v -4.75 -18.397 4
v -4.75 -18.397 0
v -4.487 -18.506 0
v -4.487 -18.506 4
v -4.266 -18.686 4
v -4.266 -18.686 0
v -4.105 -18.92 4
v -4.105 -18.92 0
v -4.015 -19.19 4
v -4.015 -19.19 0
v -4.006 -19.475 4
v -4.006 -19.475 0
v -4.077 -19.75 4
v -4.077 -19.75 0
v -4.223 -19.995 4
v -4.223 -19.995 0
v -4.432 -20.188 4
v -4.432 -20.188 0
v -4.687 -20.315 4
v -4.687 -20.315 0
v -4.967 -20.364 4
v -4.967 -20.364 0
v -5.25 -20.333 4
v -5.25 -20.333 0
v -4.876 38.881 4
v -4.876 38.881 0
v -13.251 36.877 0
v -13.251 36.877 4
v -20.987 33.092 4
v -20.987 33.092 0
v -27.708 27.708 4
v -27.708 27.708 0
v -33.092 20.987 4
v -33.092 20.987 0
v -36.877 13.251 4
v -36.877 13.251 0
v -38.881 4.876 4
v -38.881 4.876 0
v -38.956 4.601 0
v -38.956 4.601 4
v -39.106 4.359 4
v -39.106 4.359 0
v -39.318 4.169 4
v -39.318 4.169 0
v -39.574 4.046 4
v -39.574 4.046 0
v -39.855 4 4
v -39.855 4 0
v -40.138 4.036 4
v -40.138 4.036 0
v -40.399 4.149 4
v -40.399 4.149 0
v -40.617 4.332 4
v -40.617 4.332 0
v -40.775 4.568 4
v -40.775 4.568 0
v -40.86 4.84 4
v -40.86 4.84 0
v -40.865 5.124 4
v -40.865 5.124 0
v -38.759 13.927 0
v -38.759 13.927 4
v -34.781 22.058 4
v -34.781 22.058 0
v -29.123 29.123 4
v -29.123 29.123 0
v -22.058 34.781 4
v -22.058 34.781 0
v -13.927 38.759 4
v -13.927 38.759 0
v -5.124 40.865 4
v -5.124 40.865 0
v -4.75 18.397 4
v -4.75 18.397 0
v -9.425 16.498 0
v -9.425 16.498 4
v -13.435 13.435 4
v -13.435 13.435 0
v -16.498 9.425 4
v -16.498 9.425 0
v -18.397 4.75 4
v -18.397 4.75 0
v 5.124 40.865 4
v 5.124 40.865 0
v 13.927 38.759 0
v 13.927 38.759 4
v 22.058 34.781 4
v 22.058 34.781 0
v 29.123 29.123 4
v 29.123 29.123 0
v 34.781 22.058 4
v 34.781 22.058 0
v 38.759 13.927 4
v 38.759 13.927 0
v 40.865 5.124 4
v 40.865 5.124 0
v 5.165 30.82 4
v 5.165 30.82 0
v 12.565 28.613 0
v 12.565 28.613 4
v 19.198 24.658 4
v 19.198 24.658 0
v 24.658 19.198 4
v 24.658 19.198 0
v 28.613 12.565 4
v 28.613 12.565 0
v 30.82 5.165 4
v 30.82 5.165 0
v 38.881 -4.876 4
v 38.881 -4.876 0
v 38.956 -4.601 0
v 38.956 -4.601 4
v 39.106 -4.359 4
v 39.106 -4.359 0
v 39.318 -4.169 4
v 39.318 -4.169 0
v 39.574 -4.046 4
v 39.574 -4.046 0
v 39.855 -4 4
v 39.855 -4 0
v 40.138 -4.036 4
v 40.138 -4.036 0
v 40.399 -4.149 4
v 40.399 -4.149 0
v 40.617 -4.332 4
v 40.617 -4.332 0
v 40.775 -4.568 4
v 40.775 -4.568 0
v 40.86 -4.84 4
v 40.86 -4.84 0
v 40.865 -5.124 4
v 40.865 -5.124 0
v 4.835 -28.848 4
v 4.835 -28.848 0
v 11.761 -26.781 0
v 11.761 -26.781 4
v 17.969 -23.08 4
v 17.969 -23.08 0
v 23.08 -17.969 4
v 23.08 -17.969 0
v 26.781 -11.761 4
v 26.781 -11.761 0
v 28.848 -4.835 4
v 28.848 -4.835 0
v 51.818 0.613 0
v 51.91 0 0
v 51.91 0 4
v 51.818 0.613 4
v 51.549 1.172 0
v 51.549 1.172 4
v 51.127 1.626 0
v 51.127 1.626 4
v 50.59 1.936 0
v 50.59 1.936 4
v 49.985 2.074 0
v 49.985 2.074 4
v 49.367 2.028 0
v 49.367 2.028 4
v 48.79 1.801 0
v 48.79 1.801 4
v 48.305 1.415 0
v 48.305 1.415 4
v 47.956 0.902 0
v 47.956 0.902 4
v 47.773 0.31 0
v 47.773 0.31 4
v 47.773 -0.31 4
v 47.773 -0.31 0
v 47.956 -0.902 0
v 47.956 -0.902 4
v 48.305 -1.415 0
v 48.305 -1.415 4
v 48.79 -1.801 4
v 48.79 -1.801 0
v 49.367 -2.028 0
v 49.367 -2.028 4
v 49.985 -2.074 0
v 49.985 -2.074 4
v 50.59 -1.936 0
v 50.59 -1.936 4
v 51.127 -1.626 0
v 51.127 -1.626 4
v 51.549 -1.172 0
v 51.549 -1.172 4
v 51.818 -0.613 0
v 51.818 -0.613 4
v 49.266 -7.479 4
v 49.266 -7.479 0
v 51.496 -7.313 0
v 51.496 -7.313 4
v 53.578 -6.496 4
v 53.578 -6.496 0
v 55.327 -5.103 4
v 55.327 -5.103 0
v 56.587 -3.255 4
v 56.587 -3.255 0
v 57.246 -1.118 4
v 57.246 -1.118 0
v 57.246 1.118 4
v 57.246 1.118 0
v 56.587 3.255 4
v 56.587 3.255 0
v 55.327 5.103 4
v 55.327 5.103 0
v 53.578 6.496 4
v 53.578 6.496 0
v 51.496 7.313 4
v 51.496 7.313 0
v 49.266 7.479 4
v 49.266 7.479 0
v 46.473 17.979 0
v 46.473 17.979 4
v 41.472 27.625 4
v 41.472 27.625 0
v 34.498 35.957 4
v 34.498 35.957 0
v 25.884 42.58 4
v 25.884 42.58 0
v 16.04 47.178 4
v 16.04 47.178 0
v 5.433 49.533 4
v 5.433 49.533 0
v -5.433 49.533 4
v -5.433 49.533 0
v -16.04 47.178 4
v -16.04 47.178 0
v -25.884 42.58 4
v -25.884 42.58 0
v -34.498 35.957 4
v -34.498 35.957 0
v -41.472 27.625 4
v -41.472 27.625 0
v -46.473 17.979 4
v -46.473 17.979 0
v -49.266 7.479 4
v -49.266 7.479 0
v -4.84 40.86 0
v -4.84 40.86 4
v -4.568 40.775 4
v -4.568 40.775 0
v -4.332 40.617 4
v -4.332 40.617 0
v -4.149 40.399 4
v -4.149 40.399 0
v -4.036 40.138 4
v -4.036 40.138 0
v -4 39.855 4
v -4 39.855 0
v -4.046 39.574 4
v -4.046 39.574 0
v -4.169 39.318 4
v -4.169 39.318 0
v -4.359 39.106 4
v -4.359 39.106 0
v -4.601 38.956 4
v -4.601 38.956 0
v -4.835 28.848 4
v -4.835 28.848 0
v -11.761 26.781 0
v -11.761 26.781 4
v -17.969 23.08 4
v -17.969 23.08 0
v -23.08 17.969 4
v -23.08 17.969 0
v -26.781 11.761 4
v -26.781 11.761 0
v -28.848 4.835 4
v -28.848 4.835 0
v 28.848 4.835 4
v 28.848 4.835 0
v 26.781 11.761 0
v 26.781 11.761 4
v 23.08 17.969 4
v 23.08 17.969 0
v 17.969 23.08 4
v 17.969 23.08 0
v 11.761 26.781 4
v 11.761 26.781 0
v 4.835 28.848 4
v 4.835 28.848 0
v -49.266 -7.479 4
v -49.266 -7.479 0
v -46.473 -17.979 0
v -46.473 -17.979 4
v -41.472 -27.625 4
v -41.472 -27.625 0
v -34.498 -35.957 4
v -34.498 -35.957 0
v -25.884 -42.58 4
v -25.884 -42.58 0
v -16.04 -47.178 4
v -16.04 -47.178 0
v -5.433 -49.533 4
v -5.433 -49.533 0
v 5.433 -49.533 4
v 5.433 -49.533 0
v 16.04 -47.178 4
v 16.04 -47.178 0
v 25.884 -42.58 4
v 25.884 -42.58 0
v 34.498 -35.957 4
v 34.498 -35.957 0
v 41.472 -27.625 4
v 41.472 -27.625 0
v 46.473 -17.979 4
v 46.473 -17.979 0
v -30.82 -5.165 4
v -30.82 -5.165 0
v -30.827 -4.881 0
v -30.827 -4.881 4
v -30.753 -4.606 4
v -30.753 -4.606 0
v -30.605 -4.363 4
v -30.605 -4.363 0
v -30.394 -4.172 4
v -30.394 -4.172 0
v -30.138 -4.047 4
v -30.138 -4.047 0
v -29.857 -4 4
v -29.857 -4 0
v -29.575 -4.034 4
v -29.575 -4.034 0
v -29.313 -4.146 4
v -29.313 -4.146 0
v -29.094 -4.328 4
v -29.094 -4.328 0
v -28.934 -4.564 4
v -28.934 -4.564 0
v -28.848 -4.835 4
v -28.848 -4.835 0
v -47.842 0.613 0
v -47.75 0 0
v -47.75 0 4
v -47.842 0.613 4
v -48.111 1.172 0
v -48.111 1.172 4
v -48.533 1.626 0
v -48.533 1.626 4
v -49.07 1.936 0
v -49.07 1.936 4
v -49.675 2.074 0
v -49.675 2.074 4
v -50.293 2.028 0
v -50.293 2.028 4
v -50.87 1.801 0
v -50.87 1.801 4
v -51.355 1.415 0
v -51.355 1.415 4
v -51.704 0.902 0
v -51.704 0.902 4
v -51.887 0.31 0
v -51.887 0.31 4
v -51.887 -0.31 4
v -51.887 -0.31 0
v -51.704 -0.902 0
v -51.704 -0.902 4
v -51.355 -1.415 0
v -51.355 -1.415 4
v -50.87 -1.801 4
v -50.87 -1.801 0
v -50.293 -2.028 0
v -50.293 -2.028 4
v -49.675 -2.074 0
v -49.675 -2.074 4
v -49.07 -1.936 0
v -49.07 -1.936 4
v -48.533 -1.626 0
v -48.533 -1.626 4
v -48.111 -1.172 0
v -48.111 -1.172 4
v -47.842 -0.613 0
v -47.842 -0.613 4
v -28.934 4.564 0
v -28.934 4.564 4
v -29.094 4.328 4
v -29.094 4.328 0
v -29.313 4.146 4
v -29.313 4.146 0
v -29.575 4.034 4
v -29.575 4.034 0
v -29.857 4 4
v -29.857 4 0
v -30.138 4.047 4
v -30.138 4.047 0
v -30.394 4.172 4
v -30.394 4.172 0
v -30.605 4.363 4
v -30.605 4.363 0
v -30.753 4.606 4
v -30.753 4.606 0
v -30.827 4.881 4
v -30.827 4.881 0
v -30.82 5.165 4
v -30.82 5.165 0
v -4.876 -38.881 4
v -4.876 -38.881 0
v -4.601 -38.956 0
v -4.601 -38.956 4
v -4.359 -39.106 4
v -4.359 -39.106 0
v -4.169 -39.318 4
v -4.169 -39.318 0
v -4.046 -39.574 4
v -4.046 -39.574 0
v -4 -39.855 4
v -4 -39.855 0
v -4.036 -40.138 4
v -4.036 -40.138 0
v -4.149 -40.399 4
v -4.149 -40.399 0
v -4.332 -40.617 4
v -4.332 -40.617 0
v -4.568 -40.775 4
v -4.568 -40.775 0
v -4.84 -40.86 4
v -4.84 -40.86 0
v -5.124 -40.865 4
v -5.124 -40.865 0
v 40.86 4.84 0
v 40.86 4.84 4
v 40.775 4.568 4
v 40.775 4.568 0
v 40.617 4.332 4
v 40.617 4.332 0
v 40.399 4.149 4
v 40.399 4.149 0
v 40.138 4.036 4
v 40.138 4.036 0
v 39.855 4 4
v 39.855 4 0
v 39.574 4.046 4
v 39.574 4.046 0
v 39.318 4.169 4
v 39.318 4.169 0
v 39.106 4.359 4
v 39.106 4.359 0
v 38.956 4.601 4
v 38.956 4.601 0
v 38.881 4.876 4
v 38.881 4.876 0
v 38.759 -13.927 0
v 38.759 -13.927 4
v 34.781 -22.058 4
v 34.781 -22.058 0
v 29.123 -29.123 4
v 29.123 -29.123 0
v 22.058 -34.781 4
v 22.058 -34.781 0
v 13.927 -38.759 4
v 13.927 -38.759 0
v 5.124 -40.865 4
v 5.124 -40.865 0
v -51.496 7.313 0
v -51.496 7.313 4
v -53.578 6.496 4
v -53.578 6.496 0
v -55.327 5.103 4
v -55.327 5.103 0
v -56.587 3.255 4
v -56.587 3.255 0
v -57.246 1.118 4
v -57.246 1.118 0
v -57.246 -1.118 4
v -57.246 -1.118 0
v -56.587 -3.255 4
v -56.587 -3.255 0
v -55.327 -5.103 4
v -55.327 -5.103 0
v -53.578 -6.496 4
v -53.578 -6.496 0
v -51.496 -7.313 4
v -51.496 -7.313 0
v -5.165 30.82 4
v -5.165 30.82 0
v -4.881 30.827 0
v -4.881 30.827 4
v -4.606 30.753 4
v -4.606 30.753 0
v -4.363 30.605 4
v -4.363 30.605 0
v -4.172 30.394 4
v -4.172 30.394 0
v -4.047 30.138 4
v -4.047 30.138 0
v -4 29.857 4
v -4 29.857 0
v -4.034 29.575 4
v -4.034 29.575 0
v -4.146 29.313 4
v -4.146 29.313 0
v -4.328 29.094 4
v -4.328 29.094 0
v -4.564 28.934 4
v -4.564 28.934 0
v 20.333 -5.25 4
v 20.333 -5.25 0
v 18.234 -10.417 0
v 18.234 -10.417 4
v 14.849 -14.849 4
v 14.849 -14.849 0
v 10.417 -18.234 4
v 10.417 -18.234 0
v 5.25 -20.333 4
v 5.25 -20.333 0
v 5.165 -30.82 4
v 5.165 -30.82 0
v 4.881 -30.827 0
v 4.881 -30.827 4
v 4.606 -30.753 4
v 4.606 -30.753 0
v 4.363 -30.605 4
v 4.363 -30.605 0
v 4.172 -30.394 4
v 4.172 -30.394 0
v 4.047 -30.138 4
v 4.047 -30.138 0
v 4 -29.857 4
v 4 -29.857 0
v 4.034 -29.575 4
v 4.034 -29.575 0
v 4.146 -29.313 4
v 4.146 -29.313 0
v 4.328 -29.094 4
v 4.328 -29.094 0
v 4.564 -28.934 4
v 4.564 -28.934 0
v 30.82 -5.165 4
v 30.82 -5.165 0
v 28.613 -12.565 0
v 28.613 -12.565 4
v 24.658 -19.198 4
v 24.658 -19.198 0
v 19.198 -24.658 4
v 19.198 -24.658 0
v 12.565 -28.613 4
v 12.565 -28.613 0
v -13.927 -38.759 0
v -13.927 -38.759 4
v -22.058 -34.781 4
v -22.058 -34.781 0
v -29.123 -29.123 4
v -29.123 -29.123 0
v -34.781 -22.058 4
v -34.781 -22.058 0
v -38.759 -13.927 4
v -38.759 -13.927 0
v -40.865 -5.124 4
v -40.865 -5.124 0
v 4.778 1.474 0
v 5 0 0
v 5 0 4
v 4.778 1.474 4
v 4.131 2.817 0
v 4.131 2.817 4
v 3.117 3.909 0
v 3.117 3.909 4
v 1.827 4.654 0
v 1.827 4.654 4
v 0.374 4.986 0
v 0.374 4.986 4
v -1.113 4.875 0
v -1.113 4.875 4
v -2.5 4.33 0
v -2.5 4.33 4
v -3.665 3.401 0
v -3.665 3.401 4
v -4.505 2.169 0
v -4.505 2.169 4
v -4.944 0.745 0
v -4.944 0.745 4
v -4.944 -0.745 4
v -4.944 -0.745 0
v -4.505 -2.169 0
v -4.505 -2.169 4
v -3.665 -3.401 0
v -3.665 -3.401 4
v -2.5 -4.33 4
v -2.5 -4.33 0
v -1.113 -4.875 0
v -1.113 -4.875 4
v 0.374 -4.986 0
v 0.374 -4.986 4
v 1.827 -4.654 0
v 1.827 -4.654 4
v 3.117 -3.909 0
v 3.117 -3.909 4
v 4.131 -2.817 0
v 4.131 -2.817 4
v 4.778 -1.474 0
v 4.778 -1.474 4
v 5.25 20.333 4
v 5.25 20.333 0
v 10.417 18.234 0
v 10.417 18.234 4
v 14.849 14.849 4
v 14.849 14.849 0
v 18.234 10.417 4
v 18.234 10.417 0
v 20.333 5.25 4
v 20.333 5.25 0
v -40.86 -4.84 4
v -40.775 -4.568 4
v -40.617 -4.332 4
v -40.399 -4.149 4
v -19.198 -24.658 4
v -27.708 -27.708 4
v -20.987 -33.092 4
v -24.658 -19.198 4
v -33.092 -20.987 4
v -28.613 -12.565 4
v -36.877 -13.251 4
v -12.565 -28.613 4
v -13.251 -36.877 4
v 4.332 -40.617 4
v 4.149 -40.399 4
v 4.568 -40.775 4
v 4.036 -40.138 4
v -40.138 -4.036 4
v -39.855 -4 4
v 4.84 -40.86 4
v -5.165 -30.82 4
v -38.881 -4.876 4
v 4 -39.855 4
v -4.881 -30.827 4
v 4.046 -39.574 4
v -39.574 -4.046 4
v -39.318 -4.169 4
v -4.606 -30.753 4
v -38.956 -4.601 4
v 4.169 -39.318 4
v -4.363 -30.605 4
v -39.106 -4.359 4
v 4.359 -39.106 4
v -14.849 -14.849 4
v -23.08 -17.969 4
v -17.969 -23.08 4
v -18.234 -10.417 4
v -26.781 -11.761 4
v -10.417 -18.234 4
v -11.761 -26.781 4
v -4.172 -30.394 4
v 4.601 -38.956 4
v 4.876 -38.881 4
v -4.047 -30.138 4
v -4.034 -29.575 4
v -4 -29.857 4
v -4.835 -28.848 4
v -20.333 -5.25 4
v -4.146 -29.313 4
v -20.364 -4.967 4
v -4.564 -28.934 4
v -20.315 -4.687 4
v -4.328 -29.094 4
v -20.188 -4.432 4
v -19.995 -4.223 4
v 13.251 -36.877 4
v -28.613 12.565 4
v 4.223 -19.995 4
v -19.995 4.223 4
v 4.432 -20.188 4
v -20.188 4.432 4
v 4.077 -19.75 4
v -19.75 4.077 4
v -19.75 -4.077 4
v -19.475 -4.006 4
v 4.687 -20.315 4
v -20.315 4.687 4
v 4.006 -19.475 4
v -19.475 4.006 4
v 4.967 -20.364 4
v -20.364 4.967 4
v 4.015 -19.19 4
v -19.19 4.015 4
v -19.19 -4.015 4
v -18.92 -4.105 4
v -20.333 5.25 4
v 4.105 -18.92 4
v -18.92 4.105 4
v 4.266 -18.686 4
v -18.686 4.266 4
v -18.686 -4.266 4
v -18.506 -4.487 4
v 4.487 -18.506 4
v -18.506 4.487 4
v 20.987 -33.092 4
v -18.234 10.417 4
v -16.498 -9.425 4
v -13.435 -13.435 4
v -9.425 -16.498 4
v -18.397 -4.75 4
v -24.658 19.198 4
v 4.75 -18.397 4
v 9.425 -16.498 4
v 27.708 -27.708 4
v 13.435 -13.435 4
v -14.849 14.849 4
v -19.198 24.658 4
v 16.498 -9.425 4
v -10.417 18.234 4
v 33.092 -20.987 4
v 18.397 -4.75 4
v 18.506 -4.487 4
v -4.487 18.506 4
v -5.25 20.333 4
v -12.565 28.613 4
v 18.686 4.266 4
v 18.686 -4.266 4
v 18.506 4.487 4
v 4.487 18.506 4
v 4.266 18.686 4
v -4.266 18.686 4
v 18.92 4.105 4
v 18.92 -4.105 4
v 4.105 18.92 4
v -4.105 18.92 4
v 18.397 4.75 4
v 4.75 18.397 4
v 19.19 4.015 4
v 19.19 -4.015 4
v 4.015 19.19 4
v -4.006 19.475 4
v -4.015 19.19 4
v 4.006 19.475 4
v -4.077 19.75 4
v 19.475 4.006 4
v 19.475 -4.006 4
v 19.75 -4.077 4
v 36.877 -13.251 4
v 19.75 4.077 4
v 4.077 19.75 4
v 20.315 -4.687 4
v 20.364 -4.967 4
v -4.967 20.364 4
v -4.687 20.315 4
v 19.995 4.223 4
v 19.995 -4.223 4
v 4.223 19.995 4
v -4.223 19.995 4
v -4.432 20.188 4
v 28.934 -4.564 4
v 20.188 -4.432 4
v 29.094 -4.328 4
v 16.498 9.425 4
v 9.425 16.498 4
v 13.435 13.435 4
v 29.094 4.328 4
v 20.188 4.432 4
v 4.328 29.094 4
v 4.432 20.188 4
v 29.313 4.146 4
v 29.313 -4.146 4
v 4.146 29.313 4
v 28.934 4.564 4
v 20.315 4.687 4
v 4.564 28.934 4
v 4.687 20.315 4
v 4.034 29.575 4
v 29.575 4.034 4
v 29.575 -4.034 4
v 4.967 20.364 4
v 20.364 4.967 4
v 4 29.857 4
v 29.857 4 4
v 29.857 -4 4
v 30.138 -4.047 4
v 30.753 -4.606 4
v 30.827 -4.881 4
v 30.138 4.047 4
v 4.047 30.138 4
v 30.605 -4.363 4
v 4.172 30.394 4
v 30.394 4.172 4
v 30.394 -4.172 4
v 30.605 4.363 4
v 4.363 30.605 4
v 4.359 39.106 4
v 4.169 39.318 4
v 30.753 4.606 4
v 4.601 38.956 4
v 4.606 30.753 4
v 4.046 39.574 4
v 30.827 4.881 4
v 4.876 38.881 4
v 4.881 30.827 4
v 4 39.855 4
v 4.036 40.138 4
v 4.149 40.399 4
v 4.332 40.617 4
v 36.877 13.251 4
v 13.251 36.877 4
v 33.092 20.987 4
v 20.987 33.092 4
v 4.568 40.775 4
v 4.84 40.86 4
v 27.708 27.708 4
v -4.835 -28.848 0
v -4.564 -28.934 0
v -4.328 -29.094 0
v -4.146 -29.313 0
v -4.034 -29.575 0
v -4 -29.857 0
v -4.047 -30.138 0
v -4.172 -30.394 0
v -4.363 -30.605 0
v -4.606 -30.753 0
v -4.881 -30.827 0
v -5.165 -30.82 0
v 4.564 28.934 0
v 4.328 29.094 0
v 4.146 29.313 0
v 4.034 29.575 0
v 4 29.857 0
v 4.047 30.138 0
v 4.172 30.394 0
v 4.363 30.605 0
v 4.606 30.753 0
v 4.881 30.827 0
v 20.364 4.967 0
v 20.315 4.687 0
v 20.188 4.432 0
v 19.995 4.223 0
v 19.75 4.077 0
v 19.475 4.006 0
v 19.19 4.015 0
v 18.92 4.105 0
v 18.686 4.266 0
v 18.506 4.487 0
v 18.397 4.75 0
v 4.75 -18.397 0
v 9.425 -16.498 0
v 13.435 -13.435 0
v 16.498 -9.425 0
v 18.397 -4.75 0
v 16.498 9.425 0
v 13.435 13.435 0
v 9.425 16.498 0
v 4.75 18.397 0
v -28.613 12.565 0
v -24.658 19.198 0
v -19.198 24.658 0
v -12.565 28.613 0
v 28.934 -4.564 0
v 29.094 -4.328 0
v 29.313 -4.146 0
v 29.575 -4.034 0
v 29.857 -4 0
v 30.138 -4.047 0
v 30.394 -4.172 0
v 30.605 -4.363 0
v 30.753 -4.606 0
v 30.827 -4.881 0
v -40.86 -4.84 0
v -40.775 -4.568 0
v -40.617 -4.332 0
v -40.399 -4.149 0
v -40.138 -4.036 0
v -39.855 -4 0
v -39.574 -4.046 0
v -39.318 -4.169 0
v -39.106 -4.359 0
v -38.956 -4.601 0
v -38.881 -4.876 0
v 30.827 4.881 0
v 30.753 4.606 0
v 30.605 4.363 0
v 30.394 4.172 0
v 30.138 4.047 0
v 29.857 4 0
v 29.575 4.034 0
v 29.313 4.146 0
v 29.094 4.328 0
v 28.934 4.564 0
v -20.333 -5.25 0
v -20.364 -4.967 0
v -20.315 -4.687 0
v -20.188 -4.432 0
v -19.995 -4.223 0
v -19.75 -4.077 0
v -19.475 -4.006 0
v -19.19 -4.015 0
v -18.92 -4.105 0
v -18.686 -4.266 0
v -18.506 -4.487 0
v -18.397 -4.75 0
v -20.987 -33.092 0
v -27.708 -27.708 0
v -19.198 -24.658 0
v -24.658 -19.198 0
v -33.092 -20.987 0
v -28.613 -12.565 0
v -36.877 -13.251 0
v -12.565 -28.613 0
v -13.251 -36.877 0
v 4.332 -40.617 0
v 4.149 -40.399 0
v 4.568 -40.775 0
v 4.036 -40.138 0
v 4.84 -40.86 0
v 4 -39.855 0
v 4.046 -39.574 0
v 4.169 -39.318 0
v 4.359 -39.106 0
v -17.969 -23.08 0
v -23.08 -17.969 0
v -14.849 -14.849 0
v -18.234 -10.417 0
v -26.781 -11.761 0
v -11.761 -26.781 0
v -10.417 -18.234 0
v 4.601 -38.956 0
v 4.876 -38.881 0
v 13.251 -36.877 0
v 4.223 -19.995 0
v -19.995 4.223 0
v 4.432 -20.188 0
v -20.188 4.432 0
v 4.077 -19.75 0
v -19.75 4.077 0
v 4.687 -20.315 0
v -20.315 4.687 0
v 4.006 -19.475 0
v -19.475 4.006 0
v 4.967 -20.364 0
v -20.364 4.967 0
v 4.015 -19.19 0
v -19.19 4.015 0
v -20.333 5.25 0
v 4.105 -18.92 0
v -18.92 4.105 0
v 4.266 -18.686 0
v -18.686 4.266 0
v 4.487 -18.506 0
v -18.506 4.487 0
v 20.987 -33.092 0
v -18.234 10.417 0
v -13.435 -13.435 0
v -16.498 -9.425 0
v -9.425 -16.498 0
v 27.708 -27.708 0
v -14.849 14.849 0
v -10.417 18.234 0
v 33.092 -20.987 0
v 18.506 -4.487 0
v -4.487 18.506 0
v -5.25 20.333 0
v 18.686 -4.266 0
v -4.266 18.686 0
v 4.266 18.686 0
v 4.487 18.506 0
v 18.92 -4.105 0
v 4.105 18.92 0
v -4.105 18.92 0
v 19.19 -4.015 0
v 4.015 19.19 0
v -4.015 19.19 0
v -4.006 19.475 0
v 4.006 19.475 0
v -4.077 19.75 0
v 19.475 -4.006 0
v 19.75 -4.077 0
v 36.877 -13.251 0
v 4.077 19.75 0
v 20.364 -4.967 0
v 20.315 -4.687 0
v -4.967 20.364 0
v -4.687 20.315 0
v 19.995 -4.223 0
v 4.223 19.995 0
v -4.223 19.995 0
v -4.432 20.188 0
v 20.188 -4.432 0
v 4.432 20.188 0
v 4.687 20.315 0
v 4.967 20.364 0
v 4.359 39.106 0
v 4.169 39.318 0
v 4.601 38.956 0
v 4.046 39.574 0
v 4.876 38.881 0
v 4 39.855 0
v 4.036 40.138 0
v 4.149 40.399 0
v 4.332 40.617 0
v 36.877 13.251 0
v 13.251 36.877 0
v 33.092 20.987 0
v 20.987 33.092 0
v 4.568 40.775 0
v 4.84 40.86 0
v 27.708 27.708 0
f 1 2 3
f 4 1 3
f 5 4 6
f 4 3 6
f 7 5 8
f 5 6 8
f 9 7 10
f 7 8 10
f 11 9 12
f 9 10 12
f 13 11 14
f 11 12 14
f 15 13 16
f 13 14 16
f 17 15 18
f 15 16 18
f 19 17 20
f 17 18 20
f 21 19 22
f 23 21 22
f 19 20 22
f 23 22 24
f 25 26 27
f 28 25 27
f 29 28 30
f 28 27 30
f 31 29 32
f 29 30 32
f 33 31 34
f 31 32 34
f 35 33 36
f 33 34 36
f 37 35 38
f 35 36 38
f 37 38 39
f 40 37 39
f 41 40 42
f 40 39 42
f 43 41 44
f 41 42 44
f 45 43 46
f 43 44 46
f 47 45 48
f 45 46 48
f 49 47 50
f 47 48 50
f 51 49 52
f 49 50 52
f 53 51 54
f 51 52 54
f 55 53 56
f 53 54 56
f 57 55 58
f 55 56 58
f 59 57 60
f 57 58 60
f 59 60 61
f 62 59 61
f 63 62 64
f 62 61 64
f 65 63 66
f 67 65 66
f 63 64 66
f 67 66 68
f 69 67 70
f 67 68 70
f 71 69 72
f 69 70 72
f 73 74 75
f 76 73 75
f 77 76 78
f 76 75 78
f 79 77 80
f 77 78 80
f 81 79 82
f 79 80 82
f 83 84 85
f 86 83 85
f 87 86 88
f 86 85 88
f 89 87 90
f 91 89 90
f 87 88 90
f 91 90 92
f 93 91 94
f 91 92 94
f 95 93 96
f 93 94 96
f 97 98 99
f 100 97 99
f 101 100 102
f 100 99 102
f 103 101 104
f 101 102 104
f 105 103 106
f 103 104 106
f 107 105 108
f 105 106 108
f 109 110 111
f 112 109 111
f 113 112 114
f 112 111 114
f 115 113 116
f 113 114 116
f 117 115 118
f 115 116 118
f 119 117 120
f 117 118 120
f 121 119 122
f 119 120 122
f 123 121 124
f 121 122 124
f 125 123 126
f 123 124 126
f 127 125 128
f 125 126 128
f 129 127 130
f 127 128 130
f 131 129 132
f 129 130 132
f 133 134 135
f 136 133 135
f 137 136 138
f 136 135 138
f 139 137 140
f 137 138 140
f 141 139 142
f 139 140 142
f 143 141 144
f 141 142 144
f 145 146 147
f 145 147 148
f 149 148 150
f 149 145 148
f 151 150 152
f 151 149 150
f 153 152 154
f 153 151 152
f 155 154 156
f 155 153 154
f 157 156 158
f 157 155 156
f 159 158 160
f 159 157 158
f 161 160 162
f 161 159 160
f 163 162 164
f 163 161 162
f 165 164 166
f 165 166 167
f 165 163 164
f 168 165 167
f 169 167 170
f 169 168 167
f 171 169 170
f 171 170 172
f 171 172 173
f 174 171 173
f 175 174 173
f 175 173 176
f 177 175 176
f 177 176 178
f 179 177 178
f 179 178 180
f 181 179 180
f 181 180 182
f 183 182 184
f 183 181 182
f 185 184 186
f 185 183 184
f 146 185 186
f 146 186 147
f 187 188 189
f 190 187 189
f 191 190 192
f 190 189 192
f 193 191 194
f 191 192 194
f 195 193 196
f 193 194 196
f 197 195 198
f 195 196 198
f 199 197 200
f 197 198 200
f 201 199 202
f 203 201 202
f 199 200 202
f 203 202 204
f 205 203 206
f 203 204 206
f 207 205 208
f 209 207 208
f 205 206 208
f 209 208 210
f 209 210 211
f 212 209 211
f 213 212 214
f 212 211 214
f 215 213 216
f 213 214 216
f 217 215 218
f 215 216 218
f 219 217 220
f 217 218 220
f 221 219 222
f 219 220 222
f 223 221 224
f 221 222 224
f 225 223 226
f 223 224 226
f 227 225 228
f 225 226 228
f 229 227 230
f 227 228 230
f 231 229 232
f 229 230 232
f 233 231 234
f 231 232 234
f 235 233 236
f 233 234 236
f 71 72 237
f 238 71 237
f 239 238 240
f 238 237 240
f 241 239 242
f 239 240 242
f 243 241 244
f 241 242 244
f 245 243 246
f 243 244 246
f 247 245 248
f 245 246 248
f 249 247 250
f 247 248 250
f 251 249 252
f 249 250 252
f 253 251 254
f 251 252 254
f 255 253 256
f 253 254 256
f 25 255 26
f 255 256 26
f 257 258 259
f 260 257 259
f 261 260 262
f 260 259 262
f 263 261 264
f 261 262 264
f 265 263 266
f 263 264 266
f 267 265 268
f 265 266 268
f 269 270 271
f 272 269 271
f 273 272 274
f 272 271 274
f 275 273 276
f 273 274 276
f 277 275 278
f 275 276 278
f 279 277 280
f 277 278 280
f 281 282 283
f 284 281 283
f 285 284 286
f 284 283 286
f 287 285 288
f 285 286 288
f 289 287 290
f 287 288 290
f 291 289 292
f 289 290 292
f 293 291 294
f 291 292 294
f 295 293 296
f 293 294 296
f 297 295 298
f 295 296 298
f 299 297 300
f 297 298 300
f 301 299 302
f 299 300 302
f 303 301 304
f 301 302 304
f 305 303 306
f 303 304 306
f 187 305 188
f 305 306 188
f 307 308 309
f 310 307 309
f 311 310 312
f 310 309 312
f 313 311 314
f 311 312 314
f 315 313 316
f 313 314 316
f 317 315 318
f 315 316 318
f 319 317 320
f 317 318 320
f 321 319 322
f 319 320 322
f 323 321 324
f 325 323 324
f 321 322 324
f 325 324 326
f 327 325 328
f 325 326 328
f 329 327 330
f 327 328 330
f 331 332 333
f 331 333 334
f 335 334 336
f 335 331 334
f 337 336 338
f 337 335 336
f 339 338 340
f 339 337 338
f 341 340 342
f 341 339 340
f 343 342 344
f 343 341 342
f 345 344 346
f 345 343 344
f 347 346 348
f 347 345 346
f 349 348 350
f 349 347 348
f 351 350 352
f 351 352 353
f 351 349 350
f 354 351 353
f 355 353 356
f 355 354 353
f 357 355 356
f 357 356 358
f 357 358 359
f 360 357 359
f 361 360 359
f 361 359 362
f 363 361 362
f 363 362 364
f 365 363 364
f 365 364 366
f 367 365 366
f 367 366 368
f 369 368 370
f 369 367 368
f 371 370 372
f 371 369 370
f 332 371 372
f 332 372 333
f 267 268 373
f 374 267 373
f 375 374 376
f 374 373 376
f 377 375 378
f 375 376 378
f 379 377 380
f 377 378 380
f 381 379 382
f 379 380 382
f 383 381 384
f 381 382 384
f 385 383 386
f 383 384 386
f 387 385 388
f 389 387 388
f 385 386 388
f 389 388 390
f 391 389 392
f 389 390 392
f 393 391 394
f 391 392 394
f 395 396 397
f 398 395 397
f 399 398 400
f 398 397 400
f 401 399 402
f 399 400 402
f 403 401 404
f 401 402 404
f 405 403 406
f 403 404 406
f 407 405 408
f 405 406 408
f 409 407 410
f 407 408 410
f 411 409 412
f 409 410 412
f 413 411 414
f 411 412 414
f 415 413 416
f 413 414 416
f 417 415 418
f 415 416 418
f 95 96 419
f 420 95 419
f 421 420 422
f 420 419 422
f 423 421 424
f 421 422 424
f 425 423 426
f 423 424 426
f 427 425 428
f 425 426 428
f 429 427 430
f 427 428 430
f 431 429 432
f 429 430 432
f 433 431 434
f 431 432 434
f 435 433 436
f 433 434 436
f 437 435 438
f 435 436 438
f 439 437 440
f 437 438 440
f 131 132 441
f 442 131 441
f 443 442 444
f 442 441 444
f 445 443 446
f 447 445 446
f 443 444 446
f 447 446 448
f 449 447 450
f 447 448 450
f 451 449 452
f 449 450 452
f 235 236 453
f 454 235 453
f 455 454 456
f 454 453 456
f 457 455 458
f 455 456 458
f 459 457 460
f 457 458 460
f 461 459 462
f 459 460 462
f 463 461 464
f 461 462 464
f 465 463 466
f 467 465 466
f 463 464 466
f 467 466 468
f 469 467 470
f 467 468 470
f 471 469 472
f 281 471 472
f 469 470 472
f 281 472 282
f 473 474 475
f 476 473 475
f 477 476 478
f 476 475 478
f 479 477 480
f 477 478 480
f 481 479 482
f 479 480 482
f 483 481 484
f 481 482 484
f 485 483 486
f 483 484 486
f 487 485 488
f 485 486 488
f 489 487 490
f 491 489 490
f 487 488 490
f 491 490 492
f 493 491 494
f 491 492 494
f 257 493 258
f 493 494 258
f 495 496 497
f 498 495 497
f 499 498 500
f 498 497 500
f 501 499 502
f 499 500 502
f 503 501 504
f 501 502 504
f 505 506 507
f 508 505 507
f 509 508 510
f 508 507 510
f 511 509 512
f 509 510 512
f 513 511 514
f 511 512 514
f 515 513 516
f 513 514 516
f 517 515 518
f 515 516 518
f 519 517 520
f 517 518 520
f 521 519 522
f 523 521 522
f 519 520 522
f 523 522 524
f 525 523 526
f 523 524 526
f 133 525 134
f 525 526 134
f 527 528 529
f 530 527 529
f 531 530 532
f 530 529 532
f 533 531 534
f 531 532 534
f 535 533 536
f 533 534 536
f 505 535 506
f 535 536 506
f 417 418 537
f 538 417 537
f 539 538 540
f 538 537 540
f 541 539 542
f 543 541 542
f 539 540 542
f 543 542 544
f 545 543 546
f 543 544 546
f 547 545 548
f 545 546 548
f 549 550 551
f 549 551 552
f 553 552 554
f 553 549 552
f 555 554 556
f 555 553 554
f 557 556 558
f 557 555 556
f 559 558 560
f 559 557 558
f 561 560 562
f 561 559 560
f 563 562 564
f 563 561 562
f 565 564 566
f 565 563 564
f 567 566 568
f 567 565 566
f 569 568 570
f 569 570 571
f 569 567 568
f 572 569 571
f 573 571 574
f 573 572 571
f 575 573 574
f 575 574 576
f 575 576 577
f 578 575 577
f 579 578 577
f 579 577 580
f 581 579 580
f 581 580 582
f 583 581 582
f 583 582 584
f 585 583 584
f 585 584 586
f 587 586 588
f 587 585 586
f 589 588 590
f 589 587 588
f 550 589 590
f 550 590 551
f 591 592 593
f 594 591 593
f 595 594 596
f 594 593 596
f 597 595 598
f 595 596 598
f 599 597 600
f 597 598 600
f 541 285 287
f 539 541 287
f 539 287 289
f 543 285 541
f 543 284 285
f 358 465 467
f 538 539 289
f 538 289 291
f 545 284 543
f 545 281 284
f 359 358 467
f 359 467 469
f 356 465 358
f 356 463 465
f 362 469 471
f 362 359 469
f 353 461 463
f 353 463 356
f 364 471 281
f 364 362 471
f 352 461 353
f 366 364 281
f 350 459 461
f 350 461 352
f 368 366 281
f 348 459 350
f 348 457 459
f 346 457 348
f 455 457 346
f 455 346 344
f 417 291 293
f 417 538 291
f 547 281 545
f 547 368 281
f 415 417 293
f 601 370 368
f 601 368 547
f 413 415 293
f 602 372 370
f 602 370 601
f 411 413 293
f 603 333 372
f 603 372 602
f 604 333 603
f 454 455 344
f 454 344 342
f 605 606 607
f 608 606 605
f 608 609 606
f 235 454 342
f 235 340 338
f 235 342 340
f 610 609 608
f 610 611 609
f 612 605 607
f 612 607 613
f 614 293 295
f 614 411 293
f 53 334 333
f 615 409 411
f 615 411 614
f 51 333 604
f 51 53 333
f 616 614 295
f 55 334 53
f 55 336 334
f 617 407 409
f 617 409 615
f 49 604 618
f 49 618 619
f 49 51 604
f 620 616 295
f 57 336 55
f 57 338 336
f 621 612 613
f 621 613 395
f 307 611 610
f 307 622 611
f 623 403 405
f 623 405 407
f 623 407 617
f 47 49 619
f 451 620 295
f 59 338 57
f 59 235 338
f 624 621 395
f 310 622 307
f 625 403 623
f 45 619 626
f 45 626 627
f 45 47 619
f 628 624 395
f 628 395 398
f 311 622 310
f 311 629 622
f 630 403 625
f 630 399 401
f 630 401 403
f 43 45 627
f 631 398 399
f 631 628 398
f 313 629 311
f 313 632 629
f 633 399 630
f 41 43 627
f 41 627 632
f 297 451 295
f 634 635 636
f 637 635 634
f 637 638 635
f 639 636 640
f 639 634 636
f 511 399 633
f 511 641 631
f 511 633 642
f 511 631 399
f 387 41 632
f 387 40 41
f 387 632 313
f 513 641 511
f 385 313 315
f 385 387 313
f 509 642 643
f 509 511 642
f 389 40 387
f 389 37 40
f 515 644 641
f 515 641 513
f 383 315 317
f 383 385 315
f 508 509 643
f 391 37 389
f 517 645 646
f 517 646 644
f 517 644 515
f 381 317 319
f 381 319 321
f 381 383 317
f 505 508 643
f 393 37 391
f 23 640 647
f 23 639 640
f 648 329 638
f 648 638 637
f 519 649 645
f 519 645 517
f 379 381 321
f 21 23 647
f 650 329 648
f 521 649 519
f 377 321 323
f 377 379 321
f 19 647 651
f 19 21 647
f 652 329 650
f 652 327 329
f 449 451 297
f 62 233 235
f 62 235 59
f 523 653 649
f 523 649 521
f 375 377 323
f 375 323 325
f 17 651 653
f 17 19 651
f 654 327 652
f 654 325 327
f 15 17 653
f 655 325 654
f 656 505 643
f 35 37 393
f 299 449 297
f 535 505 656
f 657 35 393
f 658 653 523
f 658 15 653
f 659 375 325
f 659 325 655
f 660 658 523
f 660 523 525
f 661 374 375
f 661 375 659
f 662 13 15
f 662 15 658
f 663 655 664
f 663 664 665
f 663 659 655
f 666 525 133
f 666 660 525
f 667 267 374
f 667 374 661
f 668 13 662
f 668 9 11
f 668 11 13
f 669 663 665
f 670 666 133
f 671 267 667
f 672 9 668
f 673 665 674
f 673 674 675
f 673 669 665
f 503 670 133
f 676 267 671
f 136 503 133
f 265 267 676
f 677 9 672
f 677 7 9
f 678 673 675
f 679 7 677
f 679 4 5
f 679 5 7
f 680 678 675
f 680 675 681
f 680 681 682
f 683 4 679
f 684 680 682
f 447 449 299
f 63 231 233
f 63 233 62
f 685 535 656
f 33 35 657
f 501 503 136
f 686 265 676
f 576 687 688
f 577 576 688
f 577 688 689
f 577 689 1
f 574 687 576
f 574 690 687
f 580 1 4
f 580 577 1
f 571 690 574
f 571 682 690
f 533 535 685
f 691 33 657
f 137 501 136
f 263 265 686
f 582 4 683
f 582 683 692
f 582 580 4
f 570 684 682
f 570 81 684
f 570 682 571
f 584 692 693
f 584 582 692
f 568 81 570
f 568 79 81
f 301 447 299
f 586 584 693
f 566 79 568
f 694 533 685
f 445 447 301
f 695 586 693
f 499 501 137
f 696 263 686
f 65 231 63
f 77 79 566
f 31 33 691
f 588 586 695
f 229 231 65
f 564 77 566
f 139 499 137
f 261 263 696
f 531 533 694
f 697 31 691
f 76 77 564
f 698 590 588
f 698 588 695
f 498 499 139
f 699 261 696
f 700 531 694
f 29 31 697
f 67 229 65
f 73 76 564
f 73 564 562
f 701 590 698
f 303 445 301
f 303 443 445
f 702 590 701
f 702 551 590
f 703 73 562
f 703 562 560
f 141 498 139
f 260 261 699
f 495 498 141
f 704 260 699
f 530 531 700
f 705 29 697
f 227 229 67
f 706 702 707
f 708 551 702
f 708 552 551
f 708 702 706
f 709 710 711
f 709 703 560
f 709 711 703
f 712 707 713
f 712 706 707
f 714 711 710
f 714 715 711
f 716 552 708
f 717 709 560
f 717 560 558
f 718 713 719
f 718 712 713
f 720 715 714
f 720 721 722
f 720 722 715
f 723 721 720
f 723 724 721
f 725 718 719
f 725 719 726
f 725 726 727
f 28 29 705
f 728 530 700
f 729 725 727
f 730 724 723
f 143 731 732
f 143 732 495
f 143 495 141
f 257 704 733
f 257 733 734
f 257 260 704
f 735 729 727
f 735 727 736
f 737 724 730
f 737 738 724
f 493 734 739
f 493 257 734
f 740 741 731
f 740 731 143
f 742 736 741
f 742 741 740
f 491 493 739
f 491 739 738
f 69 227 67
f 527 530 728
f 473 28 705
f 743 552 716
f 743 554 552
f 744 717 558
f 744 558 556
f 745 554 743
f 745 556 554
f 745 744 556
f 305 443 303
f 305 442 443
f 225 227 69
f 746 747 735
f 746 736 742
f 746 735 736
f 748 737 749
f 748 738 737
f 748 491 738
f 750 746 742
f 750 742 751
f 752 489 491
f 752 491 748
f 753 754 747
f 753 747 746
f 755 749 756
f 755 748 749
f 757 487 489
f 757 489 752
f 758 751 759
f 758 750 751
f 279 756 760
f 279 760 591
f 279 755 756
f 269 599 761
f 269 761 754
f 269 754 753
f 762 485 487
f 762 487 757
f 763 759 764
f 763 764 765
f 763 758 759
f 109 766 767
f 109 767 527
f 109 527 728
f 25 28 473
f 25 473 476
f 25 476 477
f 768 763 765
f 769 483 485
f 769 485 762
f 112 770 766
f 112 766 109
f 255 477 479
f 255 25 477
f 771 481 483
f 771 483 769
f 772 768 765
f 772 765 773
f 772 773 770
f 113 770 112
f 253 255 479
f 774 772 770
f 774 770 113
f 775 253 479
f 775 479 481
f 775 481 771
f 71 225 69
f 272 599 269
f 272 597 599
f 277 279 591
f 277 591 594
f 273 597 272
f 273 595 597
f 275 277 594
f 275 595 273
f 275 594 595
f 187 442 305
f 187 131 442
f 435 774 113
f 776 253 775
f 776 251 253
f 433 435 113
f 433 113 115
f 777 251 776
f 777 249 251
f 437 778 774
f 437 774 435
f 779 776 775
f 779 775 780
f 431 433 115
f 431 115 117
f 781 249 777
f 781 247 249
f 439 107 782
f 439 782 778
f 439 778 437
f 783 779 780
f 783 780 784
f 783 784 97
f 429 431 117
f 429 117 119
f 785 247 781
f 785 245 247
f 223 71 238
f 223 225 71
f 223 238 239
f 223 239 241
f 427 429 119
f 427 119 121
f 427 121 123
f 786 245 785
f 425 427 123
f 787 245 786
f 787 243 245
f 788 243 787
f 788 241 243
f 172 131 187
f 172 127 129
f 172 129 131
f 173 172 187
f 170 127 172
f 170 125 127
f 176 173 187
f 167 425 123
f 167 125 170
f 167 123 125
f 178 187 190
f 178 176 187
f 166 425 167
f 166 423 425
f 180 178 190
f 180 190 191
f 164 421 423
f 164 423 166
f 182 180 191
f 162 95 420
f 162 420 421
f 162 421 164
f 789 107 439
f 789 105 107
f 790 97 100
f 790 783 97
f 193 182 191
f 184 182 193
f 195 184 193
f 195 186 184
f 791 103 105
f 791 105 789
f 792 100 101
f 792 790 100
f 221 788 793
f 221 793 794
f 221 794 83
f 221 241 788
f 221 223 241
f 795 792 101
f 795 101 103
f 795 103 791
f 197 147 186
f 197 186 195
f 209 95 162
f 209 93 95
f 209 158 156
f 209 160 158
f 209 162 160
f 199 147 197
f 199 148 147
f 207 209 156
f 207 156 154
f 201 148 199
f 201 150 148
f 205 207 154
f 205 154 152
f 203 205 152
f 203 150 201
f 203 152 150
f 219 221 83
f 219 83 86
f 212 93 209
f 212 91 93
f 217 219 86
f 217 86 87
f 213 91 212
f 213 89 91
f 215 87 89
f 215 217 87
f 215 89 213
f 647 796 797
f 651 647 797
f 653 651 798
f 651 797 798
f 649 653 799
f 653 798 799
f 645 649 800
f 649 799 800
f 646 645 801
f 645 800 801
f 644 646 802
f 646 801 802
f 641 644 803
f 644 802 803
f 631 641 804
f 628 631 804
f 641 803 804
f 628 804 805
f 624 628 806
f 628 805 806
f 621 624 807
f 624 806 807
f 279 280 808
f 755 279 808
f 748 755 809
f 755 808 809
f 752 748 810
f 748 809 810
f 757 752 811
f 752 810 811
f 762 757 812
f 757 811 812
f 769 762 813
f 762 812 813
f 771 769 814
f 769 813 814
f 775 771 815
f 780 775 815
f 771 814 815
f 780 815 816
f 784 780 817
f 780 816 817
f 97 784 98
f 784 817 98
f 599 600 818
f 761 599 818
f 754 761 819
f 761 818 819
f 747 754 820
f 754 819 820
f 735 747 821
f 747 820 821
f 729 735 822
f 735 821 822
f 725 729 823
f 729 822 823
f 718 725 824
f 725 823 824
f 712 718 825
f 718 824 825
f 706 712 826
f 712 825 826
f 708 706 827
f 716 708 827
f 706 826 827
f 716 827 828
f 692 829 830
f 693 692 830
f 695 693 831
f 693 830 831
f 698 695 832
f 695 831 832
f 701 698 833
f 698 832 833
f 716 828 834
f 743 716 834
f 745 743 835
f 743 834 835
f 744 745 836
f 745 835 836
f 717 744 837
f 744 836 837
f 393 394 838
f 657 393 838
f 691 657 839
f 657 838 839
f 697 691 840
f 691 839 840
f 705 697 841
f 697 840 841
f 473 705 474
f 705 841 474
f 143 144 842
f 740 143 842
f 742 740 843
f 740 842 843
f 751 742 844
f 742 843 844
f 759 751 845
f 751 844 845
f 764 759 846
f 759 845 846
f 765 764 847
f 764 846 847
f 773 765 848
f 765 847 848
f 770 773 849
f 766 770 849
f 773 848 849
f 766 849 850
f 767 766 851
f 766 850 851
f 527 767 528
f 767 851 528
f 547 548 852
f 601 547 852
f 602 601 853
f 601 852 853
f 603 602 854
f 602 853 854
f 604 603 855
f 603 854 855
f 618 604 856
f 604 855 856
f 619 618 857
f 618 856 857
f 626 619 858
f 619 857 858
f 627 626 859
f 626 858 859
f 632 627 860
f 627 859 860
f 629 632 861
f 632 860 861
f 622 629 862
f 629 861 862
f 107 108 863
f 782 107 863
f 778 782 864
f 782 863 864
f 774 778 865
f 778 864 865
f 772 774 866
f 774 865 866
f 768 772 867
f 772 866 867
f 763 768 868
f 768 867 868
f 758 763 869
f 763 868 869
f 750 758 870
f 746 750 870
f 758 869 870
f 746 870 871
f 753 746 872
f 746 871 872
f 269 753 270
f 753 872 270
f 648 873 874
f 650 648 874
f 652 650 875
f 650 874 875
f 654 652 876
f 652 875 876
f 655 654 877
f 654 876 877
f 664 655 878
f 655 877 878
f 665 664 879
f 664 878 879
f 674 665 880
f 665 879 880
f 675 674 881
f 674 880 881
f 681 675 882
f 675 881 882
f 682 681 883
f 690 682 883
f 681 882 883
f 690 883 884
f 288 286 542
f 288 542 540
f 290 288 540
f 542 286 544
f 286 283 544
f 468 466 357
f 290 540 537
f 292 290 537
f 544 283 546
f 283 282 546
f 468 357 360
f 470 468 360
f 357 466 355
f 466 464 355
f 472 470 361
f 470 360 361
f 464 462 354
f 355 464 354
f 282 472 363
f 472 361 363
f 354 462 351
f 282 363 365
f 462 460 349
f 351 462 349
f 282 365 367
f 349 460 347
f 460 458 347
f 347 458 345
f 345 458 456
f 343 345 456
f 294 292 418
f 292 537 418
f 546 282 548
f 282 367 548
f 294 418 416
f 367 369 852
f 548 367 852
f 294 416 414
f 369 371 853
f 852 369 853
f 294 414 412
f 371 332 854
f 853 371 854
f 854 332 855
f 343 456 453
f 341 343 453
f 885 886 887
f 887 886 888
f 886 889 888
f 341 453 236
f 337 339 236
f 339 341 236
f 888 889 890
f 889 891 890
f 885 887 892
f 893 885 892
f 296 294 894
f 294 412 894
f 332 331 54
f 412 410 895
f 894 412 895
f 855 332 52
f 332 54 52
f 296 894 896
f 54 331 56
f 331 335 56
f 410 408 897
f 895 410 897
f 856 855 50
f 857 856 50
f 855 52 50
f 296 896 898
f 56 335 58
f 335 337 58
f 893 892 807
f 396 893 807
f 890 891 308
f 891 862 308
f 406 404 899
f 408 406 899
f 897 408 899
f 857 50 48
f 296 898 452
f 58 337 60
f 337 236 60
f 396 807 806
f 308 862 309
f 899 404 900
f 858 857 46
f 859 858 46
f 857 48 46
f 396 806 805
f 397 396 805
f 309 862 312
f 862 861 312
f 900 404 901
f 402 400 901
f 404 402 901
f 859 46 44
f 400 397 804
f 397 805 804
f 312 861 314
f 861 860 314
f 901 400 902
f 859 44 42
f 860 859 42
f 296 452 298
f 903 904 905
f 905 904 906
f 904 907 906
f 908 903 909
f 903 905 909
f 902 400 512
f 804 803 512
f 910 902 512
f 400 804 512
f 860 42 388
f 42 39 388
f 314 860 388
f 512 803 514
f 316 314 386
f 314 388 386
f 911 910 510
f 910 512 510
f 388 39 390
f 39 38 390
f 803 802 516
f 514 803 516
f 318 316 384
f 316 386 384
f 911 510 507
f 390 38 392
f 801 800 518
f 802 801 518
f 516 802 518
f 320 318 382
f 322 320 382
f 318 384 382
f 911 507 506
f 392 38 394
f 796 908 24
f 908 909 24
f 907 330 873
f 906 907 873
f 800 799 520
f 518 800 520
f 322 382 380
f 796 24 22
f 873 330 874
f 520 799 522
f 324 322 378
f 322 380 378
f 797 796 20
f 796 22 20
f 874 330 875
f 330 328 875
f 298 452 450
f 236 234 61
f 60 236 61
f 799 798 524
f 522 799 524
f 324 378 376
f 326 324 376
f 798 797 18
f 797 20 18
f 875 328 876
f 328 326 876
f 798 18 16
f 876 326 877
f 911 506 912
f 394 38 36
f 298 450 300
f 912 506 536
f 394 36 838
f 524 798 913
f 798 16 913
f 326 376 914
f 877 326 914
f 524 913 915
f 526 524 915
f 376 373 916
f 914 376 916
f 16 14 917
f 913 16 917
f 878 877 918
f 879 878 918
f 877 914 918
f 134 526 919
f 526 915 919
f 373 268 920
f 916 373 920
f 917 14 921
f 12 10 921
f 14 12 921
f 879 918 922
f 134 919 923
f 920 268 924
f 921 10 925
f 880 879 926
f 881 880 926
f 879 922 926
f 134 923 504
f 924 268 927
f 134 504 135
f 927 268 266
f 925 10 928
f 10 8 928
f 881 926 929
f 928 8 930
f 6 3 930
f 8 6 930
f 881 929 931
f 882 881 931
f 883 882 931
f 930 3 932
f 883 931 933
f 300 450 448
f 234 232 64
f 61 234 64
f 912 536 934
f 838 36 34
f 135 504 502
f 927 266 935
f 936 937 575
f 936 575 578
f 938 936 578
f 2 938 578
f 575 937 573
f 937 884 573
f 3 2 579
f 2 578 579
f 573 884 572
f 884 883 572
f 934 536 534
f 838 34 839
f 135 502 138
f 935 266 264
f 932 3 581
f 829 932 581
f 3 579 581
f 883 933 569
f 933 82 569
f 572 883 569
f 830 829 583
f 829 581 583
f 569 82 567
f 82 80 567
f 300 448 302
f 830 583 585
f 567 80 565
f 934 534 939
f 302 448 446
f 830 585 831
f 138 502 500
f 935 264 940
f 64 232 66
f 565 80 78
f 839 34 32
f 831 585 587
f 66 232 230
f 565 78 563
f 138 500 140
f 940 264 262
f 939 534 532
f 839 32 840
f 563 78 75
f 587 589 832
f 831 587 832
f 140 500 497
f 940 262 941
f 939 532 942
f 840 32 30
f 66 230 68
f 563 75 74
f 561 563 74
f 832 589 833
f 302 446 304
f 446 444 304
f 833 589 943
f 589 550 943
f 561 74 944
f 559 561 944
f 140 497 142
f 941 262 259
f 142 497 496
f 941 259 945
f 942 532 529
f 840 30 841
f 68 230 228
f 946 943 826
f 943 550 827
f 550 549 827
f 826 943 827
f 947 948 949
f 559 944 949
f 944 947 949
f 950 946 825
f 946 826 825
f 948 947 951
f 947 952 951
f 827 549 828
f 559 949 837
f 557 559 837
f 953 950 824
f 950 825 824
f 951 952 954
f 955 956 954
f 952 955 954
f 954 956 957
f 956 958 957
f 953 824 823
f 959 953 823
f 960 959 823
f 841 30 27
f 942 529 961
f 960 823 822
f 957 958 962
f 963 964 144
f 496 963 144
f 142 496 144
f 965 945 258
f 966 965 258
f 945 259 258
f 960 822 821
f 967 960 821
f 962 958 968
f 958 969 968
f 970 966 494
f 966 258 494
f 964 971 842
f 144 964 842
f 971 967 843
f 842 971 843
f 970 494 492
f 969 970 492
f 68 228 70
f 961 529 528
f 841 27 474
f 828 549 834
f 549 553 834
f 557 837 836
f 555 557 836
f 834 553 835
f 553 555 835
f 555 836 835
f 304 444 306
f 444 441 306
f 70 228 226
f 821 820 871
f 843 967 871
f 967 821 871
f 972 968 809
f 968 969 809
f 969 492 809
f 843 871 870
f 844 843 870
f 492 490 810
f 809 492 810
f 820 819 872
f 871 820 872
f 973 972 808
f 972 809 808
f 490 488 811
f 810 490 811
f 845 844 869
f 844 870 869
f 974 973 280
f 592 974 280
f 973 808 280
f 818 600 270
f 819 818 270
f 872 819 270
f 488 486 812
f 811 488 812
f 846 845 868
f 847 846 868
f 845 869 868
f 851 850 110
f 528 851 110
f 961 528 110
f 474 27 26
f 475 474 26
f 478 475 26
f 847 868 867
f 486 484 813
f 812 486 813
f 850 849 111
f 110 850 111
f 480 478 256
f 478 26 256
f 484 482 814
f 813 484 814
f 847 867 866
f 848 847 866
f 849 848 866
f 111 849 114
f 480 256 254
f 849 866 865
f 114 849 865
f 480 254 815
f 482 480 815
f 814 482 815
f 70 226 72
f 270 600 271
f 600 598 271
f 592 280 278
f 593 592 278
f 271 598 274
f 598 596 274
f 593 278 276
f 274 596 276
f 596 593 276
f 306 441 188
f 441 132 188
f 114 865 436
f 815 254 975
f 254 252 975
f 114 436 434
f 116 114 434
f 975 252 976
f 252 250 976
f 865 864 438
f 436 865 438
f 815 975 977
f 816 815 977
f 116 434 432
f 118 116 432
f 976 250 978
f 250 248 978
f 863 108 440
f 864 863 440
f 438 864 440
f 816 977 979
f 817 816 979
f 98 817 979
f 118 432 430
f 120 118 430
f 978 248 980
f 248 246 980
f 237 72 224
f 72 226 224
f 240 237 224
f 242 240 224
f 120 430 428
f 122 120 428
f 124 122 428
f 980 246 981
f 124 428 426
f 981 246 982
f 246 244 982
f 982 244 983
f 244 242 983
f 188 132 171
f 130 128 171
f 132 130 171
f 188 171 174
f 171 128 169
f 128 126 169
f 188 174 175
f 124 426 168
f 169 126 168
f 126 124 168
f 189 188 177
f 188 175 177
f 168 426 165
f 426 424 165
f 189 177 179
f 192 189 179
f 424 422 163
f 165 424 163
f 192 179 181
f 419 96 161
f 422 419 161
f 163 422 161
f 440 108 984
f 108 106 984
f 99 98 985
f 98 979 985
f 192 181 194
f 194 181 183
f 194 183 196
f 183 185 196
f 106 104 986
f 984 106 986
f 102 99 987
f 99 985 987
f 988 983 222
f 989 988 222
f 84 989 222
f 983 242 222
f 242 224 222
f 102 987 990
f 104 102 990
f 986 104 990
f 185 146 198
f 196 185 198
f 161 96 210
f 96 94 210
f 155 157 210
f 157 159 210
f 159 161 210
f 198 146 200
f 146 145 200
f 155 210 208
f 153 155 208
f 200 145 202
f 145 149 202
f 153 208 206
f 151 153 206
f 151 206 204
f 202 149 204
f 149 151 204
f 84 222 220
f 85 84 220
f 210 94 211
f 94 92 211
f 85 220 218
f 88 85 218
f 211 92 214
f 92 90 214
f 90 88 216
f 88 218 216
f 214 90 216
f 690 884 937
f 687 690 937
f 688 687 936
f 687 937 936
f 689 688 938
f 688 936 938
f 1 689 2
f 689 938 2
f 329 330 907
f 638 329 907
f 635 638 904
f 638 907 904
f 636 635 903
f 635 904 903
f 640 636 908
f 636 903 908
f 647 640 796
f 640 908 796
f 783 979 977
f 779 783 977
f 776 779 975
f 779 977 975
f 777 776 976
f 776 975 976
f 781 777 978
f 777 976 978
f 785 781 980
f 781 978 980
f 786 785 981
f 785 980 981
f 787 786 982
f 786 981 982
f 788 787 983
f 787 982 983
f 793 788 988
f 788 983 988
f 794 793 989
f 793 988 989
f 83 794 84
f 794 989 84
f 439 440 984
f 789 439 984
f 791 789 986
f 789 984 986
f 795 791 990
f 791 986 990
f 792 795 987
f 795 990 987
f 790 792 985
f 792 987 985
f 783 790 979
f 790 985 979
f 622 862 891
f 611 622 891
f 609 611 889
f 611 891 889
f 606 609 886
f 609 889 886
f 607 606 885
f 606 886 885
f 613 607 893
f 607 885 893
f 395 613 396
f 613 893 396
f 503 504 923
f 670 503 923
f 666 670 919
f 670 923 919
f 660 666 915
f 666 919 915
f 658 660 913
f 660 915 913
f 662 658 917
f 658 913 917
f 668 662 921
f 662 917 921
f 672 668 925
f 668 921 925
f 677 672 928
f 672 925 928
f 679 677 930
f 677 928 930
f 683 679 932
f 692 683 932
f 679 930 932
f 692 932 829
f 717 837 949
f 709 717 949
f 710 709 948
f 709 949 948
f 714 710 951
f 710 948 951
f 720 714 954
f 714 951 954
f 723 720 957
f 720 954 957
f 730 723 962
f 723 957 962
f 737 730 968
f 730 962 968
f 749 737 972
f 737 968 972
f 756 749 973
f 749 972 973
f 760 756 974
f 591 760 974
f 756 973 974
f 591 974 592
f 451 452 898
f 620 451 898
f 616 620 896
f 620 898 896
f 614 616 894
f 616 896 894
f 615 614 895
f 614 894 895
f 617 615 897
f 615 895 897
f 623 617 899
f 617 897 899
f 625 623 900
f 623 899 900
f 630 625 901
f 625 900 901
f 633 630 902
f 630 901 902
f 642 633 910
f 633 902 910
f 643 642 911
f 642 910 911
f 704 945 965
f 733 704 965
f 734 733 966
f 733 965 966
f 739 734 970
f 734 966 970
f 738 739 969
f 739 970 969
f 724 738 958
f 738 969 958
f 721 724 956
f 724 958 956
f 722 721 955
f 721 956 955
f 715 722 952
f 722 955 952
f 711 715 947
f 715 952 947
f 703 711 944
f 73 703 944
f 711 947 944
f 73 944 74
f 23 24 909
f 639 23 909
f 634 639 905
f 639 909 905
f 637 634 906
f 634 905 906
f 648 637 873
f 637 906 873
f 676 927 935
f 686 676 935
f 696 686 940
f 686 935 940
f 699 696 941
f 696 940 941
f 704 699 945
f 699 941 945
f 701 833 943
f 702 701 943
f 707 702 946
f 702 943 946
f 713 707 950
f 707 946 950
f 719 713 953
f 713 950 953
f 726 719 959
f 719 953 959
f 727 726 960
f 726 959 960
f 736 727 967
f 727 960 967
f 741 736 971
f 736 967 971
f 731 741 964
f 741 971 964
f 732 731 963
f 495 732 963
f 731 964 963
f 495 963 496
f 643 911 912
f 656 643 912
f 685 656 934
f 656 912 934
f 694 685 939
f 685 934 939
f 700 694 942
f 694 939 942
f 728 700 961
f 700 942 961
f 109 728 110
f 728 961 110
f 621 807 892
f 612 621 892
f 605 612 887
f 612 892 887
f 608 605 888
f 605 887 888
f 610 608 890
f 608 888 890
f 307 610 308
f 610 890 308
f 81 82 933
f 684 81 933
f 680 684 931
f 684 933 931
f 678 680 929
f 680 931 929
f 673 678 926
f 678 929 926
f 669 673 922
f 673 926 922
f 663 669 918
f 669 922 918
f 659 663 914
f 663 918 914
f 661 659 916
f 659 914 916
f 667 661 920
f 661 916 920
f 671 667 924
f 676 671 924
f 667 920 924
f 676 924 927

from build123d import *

# Parameters (mm, degrees)
F0_R     = 2.08
F0_R_2   = 5
F1_DEPTH = 4


with BuildPart() as f1:
    # F0 (on Top) → F1 (new body)
    with BuildSketch(Plane.XY):
        with BuildLine():
            ThreePointArc((49.265581, 7.478732), (0, 49.83), (-49.265581, 7.478732))
            ThreePointArc((-49.265581, 7.478732), (-57.33, 0), (-49.265581, -7.478732))
            ThreePointArc((-49.265581, -7.478732), (0, -49.83), (49.265581, -7.478732))
            ThreePointArc((49.265581, -7.478732), (57.33, 0), (49.265581, 7.478732))
        make_face()
        with BuildLine():
            ThreePointArc((-5.124423, -40.865491), (-29.122569, -29.122569), (-40.865491, -5.124423))
            ThreePointArc((-40.865491, -5.124423), (-39.997684, -4.007771), (-38.881032, -4.875577))
            ThreePointArc((-38.881032, -4.875577), (-27.708355, -27.708355), (-4.875577, -38.881032))
            ThreePointArc((-4.875577, -38.881032), (-4.007771, -39.997684), (-5.124423, -40.865491))
        make_face(mode=Mode.SUBTRACT)
        with BuildLine():
            ThreePointArc((-5.165289, -30.82016), (-22.097087, -22.097087), (-30.82016, -5.165289))
            ThreePointArc((-30.82016, -5.165289), (-29.999205, -4.013755), (-28.84767, -4.834711))
            ThreePointArc((-28.84767, -4.834711), (-20.682873, -20.682873), (-4.834711, -28.84767))
            ThreePointArc((-4.834711, -28.84767), (-4.013755, -29.999205), (-5.165289, -30.82016))
        make_face(mode=Mode.SUBTRACT)
        with BuildLine():
            ThreePointArc((-20.333163, -5.25), (-19.614917, -4.031754), (-18.396671, -4.75))
            ThreePointArc((-18.396671, -4.75), (-13.435029, -13.435029), (-4.75, -18.396671))
            ThreePointArc((-4.75, -18.396671), (-4.031754, -19.614917), (-5.25, -20.333163))
            ThreePointArc((-5.25, -20.333163), (-14.849242, -14.849242), (-20.333163, -5.25))
        make_face(mode=Mode.SUBTRACT)
        with BuildLine():
            ThreePointArc((40.865491, -5.124423), (29.122569, -29.122569), (5.124423, -40.865491))
            ThreePointArc((5.124423, -40.865491), (4.007771, -39.997684), (4.875577, -38.881032))
            ThreePointArc((4.875577, -38.881032), (27.708355, -27.708355), (38.881032, -4.875577))
            ThreePointArc((38.881032, -4.875577), (39.997684, -4.007771), (40.865491, -5.124423))
        make_face(mode=Mode.SUBTRACT)
        with BuildLine():
            ThreePointArc((30.82016, -5.165289), (22.097087, -22.097087), (5.165289, -30.82016))
            ThreePointArc((5.165289, -30.82016), (4.013755, -29.999205), (4.834711, -28.84767))
            ThreePointArc((4.834711, -28.84767), (20.682873, -20.682873), (28.84767, -4.834711))
            ThreePointArc((28.84767, -4.834711), (29.999205, -4.013755), (30.82016, -5.165289))
        make_face(mode=Mode.SUBTRACT)
        with BuildLine():
            ThreePointArc((5.25, -20.333163), (4.031754, -19.614917), (4.75, -18.396671))
            ThreePointArc((4.75, -18.396671), (13.435029, -13.435029), (18.396671, -4.75))
            ThreePointArc((18.396671, -4.75), (19.614917, -4.031754), (20.333163, -5.25))
            ThreePointArc((20.333163, -5.25), (14.849242, -14.849242), (5.25, -20.333163))
        make_face(mode=Mode.SUBTRACT)
        with Locations((-49.83, 0)):
            Circle(F0_R, mode=Mode.SUBTRACT)
        Circle(F0_R_2, mode=Mode.SUBTRACT)
        with BuildLine():
            ThreePointArc((-20.333163, 5.25), (-14.849242, 14.849242), (-5.25, 20.333163))
            ThreePointArc((-5.25, 20.333163), (-4.031754, 19.614917), (-4.75, 18.396671))
            ThreePointArc((-4.75, 18.396671), (-13.435029, 13.435029), (-18.396671, 4.75))
            ThreePointArc((-18.396671, 4.75), (-19.614917, 4.031754), (-20.333163, 5.25))
        make_face(mode=Mode.SUBTRACT)
        with BuildLine():
            ThreePointArc((-30.82016, 5.165289), (-22.097087, 22.097087), (-5.165289, 30.82016))
            ThreePointArc((-5.165289, 30.82016), (-4.013755, 29.999205), (-4.834711, 28.84767))
            ThreePointArc((-4.834711, 28.84767), (-20.682873, 20.682873), (-28.84767, 4.834711))
            ThreePointArc((-28.84767, 4.834711), (-29.999205, 4.013755), (-30.82016, 5.165289))
        make_face(mode=Mode.SUBTRACT)
        with BuildLine():
            ThreePointArc((-40.865491, 5.124423), (-29.122569, 29.122569), (-5.124423, 40.865491))
            ThreePointArc((-5.124423, 40.865491), (-4.007771, 39.997684), (-4.875577, 38.881032))
            ThreePointArc((-4.875577, 38.881032), (-27.708355, 27.708355), (-38.881032, 4.875577))
            ThreePointArc((-38.881032, 4.875577), (-39.997684, 4.007771), (-40.865491, 5.124423))
        make_face(mode=Mode.SUBTRACT)
        with BuildLine():
            ThreePointArc((20.333163, 5.25), (19.614917, 4.031754), (18.396671, 4.75))
            ThreePointArc((18.396671, 4.75), (13.435029, 13.435029), (4.75, 18.396671))
            ThreePointArc((4.75, 18.396671), (4.031754, 19.614917), (5.25, 20.333163))
            ThreePointArc((5.25, 20.333163), (14.849242, 14.849242), (20.333163, 5.25))
        make_face(mode=Mode.SUBTRACT)
        with BuildLine():
            ThreePointArc((5.165289, 30.82016), (22.097087, 22.097087), (30.82016, 5.165289))
            ThreePointArc((30.82016, 5.165289), (29.999205, 4.013755), (28.84767, 4.834711))
            ThreePointArc((28.84767, 4.834711), (20.682873, 20.682873), (4.834711, 28.84767))
            ThreePointArc((4.834711, 28.84767), (4.013755, 29.999205), (5.165289, 30.82016))
        make_face(mode=Mode.SUBTRACT)
        with BuildLine():
            ThreePointArc((5.124423, 40.865491), (29.122569, 29.122569), (40.865491, 5.124423))
            ThreePointArc((40.865491, 5.124423), (39.997684, 4.007771), (38.881032, 4.875577))
            ThreePointArc((38.881032, 4.875577), (27.708355, 27.708355), (4.875577, 38.881032))
            ThreePointArc((4.875577, 38.881032), (4.007771, 39.997684), (5.124423, 40.865491))
        make_face(mode=Mode.SUBTRACT)
        with Locations((49.83, 0)):
            Circle(F0_R, mode=Mode.SUBTRACT)
    extrude(amount=F1_DEPTH)


solid = f1.part
